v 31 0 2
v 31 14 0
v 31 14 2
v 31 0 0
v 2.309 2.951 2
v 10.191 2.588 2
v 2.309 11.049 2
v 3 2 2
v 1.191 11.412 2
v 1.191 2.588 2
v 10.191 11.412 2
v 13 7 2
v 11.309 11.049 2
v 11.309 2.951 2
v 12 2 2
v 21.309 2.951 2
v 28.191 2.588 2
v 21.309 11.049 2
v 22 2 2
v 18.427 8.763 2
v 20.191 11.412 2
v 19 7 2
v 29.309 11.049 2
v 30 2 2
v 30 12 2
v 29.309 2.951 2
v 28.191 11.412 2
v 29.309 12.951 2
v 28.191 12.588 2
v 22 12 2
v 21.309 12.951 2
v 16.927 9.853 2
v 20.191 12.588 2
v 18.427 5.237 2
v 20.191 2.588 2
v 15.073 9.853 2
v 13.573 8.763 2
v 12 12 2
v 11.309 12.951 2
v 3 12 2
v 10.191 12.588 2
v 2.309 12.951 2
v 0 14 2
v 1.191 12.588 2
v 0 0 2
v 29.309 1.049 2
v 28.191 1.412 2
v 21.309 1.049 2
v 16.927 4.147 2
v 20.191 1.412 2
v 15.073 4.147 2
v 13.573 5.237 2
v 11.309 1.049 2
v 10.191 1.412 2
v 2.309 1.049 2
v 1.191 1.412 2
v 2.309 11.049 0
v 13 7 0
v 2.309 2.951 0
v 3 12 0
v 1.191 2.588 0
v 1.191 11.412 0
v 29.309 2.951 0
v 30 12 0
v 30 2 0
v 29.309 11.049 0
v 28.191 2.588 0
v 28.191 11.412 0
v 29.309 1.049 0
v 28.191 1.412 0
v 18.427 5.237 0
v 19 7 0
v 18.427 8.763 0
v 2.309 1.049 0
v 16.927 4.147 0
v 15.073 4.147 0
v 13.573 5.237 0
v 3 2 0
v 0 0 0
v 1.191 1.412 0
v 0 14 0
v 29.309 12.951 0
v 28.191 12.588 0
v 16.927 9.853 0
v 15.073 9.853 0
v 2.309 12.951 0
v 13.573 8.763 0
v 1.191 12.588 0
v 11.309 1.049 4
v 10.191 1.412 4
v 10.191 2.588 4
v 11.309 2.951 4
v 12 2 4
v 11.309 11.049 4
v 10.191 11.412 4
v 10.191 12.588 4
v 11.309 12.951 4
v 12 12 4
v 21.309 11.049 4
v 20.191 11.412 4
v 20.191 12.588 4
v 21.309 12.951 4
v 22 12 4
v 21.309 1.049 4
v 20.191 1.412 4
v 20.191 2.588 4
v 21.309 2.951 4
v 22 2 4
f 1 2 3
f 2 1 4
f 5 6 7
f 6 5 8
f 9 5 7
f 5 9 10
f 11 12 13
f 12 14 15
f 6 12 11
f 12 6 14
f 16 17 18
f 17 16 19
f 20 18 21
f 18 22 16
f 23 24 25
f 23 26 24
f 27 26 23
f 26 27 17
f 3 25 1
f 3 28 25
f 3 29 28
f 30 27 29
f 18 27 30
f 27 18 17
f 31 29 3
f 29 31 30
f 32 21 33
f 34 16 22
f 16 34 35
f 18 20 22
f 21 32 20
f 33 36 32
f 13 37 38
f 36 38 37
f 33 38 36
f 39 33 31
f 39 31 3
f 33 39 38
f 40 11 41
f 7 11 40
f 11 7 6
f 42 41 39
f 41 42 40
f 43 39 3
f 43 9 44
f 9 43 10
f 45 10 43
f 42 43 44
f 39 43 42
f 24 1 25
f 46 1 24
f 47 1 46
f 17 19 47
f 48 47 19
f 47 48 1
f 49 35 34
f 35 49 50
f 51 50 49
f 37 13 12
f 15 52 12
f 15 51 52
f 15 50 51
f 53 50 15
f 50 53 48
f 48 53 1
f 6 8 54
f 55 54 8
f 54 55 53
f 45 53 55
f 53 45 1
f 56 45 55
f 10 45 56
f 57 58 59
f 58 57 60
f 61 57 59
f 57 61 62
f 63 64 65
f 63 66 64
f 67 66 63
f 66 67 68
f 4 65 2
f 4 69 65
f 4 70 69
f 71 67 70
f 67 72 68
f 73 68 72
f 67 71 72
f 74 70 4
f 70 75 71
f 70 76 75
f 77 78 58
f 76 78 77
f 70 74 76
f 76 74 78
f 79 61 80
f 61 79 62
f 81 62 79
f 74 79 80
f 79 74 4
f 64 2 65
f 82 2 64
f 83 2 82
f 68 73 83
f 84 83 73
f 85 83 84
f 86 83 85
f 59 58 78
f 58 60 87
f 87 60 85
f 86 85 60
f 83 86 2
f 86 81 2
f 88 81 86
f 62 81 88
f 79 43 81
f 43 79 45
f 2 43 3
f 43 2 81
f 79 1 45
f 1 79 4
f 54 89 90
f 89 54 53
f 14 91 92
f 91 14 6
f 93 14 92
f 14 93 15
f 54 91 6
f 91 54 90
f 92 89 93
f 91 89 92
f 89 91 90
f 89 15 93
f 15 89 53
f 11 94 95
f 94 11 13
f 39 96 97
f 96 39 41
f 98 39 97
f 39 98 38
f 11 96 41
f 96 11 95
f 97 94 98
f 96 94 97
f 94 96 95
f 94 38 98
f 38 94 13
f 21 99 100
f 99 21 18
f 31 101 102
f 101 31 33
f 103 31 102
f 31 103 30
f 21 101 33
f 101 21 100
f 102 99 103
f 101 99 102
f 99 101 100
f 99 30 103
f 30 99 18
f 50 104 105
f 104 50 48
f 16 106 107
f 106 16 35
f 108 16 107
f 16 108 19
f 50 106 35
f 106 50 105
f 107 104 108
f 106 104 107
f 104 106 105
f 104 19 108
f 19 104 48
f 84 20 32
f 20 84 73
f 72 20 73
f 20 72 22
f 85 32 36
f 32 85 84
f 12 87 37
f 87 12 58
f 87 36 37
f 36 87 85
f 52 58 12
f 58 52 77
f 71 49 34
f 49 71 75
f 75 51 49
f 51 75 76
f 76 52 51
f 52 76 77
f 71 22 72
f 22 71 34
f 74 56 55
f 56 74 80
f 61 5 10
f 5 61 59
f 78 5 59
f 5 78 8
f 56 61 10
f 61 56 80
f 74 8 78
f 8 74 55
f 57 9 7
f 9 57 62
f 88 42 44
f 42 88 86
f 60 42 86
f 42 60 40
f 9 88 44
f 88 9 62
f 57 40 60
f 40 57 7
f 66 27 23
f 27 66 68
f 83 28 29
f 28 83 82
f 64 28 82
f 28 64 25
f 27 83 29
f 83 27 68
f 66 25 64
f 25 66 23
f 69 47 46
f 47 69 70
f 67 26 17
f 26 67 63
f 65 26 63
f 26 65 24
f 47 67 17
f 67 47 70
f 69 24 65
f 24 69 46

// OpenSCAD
module top_lid() {
	difference() {
		union() {
			// main box
			cube([31,14,2]);
			// the pins
			translate([11, 2, 3])
				cylinder(h = 2, r1 = 1, r2 = 1, center = true);
			translate([11, 12, 3])
				cylinder(h = 2, r1 = 1, r2 = 1, center = true);
			translate([21, 12, 3])
				cylinder(h = 2, r1 = 1, r2 = 1, center = true);
			translate([21, 2, 3])
				cylinder(h = 2, r1 = 1, r2 = 1, center = true);
		}
		// dump hole
		translate([16, 7, 0])
			cylinder(h = 4, r1 = 3, r2 = 3, center = true);			
		// the pin holes
		translate([2, 2, 0])
			cylinder(h = 4, r1 = 1, r2 = 1, center = true);
		translate([2, 12, 0])
			cylinder(h = 4, r1 = 1, r2 = 1, center = true);
		translate([29, 12, 0])
			cylinder(h = 4, r1 = 1, r2 = 1, center = true);
		translate([29, 2, 0])
			cylinder(h = 4, r1 = 1, r2 = 1, center = true);
	}
}
top_lid();
